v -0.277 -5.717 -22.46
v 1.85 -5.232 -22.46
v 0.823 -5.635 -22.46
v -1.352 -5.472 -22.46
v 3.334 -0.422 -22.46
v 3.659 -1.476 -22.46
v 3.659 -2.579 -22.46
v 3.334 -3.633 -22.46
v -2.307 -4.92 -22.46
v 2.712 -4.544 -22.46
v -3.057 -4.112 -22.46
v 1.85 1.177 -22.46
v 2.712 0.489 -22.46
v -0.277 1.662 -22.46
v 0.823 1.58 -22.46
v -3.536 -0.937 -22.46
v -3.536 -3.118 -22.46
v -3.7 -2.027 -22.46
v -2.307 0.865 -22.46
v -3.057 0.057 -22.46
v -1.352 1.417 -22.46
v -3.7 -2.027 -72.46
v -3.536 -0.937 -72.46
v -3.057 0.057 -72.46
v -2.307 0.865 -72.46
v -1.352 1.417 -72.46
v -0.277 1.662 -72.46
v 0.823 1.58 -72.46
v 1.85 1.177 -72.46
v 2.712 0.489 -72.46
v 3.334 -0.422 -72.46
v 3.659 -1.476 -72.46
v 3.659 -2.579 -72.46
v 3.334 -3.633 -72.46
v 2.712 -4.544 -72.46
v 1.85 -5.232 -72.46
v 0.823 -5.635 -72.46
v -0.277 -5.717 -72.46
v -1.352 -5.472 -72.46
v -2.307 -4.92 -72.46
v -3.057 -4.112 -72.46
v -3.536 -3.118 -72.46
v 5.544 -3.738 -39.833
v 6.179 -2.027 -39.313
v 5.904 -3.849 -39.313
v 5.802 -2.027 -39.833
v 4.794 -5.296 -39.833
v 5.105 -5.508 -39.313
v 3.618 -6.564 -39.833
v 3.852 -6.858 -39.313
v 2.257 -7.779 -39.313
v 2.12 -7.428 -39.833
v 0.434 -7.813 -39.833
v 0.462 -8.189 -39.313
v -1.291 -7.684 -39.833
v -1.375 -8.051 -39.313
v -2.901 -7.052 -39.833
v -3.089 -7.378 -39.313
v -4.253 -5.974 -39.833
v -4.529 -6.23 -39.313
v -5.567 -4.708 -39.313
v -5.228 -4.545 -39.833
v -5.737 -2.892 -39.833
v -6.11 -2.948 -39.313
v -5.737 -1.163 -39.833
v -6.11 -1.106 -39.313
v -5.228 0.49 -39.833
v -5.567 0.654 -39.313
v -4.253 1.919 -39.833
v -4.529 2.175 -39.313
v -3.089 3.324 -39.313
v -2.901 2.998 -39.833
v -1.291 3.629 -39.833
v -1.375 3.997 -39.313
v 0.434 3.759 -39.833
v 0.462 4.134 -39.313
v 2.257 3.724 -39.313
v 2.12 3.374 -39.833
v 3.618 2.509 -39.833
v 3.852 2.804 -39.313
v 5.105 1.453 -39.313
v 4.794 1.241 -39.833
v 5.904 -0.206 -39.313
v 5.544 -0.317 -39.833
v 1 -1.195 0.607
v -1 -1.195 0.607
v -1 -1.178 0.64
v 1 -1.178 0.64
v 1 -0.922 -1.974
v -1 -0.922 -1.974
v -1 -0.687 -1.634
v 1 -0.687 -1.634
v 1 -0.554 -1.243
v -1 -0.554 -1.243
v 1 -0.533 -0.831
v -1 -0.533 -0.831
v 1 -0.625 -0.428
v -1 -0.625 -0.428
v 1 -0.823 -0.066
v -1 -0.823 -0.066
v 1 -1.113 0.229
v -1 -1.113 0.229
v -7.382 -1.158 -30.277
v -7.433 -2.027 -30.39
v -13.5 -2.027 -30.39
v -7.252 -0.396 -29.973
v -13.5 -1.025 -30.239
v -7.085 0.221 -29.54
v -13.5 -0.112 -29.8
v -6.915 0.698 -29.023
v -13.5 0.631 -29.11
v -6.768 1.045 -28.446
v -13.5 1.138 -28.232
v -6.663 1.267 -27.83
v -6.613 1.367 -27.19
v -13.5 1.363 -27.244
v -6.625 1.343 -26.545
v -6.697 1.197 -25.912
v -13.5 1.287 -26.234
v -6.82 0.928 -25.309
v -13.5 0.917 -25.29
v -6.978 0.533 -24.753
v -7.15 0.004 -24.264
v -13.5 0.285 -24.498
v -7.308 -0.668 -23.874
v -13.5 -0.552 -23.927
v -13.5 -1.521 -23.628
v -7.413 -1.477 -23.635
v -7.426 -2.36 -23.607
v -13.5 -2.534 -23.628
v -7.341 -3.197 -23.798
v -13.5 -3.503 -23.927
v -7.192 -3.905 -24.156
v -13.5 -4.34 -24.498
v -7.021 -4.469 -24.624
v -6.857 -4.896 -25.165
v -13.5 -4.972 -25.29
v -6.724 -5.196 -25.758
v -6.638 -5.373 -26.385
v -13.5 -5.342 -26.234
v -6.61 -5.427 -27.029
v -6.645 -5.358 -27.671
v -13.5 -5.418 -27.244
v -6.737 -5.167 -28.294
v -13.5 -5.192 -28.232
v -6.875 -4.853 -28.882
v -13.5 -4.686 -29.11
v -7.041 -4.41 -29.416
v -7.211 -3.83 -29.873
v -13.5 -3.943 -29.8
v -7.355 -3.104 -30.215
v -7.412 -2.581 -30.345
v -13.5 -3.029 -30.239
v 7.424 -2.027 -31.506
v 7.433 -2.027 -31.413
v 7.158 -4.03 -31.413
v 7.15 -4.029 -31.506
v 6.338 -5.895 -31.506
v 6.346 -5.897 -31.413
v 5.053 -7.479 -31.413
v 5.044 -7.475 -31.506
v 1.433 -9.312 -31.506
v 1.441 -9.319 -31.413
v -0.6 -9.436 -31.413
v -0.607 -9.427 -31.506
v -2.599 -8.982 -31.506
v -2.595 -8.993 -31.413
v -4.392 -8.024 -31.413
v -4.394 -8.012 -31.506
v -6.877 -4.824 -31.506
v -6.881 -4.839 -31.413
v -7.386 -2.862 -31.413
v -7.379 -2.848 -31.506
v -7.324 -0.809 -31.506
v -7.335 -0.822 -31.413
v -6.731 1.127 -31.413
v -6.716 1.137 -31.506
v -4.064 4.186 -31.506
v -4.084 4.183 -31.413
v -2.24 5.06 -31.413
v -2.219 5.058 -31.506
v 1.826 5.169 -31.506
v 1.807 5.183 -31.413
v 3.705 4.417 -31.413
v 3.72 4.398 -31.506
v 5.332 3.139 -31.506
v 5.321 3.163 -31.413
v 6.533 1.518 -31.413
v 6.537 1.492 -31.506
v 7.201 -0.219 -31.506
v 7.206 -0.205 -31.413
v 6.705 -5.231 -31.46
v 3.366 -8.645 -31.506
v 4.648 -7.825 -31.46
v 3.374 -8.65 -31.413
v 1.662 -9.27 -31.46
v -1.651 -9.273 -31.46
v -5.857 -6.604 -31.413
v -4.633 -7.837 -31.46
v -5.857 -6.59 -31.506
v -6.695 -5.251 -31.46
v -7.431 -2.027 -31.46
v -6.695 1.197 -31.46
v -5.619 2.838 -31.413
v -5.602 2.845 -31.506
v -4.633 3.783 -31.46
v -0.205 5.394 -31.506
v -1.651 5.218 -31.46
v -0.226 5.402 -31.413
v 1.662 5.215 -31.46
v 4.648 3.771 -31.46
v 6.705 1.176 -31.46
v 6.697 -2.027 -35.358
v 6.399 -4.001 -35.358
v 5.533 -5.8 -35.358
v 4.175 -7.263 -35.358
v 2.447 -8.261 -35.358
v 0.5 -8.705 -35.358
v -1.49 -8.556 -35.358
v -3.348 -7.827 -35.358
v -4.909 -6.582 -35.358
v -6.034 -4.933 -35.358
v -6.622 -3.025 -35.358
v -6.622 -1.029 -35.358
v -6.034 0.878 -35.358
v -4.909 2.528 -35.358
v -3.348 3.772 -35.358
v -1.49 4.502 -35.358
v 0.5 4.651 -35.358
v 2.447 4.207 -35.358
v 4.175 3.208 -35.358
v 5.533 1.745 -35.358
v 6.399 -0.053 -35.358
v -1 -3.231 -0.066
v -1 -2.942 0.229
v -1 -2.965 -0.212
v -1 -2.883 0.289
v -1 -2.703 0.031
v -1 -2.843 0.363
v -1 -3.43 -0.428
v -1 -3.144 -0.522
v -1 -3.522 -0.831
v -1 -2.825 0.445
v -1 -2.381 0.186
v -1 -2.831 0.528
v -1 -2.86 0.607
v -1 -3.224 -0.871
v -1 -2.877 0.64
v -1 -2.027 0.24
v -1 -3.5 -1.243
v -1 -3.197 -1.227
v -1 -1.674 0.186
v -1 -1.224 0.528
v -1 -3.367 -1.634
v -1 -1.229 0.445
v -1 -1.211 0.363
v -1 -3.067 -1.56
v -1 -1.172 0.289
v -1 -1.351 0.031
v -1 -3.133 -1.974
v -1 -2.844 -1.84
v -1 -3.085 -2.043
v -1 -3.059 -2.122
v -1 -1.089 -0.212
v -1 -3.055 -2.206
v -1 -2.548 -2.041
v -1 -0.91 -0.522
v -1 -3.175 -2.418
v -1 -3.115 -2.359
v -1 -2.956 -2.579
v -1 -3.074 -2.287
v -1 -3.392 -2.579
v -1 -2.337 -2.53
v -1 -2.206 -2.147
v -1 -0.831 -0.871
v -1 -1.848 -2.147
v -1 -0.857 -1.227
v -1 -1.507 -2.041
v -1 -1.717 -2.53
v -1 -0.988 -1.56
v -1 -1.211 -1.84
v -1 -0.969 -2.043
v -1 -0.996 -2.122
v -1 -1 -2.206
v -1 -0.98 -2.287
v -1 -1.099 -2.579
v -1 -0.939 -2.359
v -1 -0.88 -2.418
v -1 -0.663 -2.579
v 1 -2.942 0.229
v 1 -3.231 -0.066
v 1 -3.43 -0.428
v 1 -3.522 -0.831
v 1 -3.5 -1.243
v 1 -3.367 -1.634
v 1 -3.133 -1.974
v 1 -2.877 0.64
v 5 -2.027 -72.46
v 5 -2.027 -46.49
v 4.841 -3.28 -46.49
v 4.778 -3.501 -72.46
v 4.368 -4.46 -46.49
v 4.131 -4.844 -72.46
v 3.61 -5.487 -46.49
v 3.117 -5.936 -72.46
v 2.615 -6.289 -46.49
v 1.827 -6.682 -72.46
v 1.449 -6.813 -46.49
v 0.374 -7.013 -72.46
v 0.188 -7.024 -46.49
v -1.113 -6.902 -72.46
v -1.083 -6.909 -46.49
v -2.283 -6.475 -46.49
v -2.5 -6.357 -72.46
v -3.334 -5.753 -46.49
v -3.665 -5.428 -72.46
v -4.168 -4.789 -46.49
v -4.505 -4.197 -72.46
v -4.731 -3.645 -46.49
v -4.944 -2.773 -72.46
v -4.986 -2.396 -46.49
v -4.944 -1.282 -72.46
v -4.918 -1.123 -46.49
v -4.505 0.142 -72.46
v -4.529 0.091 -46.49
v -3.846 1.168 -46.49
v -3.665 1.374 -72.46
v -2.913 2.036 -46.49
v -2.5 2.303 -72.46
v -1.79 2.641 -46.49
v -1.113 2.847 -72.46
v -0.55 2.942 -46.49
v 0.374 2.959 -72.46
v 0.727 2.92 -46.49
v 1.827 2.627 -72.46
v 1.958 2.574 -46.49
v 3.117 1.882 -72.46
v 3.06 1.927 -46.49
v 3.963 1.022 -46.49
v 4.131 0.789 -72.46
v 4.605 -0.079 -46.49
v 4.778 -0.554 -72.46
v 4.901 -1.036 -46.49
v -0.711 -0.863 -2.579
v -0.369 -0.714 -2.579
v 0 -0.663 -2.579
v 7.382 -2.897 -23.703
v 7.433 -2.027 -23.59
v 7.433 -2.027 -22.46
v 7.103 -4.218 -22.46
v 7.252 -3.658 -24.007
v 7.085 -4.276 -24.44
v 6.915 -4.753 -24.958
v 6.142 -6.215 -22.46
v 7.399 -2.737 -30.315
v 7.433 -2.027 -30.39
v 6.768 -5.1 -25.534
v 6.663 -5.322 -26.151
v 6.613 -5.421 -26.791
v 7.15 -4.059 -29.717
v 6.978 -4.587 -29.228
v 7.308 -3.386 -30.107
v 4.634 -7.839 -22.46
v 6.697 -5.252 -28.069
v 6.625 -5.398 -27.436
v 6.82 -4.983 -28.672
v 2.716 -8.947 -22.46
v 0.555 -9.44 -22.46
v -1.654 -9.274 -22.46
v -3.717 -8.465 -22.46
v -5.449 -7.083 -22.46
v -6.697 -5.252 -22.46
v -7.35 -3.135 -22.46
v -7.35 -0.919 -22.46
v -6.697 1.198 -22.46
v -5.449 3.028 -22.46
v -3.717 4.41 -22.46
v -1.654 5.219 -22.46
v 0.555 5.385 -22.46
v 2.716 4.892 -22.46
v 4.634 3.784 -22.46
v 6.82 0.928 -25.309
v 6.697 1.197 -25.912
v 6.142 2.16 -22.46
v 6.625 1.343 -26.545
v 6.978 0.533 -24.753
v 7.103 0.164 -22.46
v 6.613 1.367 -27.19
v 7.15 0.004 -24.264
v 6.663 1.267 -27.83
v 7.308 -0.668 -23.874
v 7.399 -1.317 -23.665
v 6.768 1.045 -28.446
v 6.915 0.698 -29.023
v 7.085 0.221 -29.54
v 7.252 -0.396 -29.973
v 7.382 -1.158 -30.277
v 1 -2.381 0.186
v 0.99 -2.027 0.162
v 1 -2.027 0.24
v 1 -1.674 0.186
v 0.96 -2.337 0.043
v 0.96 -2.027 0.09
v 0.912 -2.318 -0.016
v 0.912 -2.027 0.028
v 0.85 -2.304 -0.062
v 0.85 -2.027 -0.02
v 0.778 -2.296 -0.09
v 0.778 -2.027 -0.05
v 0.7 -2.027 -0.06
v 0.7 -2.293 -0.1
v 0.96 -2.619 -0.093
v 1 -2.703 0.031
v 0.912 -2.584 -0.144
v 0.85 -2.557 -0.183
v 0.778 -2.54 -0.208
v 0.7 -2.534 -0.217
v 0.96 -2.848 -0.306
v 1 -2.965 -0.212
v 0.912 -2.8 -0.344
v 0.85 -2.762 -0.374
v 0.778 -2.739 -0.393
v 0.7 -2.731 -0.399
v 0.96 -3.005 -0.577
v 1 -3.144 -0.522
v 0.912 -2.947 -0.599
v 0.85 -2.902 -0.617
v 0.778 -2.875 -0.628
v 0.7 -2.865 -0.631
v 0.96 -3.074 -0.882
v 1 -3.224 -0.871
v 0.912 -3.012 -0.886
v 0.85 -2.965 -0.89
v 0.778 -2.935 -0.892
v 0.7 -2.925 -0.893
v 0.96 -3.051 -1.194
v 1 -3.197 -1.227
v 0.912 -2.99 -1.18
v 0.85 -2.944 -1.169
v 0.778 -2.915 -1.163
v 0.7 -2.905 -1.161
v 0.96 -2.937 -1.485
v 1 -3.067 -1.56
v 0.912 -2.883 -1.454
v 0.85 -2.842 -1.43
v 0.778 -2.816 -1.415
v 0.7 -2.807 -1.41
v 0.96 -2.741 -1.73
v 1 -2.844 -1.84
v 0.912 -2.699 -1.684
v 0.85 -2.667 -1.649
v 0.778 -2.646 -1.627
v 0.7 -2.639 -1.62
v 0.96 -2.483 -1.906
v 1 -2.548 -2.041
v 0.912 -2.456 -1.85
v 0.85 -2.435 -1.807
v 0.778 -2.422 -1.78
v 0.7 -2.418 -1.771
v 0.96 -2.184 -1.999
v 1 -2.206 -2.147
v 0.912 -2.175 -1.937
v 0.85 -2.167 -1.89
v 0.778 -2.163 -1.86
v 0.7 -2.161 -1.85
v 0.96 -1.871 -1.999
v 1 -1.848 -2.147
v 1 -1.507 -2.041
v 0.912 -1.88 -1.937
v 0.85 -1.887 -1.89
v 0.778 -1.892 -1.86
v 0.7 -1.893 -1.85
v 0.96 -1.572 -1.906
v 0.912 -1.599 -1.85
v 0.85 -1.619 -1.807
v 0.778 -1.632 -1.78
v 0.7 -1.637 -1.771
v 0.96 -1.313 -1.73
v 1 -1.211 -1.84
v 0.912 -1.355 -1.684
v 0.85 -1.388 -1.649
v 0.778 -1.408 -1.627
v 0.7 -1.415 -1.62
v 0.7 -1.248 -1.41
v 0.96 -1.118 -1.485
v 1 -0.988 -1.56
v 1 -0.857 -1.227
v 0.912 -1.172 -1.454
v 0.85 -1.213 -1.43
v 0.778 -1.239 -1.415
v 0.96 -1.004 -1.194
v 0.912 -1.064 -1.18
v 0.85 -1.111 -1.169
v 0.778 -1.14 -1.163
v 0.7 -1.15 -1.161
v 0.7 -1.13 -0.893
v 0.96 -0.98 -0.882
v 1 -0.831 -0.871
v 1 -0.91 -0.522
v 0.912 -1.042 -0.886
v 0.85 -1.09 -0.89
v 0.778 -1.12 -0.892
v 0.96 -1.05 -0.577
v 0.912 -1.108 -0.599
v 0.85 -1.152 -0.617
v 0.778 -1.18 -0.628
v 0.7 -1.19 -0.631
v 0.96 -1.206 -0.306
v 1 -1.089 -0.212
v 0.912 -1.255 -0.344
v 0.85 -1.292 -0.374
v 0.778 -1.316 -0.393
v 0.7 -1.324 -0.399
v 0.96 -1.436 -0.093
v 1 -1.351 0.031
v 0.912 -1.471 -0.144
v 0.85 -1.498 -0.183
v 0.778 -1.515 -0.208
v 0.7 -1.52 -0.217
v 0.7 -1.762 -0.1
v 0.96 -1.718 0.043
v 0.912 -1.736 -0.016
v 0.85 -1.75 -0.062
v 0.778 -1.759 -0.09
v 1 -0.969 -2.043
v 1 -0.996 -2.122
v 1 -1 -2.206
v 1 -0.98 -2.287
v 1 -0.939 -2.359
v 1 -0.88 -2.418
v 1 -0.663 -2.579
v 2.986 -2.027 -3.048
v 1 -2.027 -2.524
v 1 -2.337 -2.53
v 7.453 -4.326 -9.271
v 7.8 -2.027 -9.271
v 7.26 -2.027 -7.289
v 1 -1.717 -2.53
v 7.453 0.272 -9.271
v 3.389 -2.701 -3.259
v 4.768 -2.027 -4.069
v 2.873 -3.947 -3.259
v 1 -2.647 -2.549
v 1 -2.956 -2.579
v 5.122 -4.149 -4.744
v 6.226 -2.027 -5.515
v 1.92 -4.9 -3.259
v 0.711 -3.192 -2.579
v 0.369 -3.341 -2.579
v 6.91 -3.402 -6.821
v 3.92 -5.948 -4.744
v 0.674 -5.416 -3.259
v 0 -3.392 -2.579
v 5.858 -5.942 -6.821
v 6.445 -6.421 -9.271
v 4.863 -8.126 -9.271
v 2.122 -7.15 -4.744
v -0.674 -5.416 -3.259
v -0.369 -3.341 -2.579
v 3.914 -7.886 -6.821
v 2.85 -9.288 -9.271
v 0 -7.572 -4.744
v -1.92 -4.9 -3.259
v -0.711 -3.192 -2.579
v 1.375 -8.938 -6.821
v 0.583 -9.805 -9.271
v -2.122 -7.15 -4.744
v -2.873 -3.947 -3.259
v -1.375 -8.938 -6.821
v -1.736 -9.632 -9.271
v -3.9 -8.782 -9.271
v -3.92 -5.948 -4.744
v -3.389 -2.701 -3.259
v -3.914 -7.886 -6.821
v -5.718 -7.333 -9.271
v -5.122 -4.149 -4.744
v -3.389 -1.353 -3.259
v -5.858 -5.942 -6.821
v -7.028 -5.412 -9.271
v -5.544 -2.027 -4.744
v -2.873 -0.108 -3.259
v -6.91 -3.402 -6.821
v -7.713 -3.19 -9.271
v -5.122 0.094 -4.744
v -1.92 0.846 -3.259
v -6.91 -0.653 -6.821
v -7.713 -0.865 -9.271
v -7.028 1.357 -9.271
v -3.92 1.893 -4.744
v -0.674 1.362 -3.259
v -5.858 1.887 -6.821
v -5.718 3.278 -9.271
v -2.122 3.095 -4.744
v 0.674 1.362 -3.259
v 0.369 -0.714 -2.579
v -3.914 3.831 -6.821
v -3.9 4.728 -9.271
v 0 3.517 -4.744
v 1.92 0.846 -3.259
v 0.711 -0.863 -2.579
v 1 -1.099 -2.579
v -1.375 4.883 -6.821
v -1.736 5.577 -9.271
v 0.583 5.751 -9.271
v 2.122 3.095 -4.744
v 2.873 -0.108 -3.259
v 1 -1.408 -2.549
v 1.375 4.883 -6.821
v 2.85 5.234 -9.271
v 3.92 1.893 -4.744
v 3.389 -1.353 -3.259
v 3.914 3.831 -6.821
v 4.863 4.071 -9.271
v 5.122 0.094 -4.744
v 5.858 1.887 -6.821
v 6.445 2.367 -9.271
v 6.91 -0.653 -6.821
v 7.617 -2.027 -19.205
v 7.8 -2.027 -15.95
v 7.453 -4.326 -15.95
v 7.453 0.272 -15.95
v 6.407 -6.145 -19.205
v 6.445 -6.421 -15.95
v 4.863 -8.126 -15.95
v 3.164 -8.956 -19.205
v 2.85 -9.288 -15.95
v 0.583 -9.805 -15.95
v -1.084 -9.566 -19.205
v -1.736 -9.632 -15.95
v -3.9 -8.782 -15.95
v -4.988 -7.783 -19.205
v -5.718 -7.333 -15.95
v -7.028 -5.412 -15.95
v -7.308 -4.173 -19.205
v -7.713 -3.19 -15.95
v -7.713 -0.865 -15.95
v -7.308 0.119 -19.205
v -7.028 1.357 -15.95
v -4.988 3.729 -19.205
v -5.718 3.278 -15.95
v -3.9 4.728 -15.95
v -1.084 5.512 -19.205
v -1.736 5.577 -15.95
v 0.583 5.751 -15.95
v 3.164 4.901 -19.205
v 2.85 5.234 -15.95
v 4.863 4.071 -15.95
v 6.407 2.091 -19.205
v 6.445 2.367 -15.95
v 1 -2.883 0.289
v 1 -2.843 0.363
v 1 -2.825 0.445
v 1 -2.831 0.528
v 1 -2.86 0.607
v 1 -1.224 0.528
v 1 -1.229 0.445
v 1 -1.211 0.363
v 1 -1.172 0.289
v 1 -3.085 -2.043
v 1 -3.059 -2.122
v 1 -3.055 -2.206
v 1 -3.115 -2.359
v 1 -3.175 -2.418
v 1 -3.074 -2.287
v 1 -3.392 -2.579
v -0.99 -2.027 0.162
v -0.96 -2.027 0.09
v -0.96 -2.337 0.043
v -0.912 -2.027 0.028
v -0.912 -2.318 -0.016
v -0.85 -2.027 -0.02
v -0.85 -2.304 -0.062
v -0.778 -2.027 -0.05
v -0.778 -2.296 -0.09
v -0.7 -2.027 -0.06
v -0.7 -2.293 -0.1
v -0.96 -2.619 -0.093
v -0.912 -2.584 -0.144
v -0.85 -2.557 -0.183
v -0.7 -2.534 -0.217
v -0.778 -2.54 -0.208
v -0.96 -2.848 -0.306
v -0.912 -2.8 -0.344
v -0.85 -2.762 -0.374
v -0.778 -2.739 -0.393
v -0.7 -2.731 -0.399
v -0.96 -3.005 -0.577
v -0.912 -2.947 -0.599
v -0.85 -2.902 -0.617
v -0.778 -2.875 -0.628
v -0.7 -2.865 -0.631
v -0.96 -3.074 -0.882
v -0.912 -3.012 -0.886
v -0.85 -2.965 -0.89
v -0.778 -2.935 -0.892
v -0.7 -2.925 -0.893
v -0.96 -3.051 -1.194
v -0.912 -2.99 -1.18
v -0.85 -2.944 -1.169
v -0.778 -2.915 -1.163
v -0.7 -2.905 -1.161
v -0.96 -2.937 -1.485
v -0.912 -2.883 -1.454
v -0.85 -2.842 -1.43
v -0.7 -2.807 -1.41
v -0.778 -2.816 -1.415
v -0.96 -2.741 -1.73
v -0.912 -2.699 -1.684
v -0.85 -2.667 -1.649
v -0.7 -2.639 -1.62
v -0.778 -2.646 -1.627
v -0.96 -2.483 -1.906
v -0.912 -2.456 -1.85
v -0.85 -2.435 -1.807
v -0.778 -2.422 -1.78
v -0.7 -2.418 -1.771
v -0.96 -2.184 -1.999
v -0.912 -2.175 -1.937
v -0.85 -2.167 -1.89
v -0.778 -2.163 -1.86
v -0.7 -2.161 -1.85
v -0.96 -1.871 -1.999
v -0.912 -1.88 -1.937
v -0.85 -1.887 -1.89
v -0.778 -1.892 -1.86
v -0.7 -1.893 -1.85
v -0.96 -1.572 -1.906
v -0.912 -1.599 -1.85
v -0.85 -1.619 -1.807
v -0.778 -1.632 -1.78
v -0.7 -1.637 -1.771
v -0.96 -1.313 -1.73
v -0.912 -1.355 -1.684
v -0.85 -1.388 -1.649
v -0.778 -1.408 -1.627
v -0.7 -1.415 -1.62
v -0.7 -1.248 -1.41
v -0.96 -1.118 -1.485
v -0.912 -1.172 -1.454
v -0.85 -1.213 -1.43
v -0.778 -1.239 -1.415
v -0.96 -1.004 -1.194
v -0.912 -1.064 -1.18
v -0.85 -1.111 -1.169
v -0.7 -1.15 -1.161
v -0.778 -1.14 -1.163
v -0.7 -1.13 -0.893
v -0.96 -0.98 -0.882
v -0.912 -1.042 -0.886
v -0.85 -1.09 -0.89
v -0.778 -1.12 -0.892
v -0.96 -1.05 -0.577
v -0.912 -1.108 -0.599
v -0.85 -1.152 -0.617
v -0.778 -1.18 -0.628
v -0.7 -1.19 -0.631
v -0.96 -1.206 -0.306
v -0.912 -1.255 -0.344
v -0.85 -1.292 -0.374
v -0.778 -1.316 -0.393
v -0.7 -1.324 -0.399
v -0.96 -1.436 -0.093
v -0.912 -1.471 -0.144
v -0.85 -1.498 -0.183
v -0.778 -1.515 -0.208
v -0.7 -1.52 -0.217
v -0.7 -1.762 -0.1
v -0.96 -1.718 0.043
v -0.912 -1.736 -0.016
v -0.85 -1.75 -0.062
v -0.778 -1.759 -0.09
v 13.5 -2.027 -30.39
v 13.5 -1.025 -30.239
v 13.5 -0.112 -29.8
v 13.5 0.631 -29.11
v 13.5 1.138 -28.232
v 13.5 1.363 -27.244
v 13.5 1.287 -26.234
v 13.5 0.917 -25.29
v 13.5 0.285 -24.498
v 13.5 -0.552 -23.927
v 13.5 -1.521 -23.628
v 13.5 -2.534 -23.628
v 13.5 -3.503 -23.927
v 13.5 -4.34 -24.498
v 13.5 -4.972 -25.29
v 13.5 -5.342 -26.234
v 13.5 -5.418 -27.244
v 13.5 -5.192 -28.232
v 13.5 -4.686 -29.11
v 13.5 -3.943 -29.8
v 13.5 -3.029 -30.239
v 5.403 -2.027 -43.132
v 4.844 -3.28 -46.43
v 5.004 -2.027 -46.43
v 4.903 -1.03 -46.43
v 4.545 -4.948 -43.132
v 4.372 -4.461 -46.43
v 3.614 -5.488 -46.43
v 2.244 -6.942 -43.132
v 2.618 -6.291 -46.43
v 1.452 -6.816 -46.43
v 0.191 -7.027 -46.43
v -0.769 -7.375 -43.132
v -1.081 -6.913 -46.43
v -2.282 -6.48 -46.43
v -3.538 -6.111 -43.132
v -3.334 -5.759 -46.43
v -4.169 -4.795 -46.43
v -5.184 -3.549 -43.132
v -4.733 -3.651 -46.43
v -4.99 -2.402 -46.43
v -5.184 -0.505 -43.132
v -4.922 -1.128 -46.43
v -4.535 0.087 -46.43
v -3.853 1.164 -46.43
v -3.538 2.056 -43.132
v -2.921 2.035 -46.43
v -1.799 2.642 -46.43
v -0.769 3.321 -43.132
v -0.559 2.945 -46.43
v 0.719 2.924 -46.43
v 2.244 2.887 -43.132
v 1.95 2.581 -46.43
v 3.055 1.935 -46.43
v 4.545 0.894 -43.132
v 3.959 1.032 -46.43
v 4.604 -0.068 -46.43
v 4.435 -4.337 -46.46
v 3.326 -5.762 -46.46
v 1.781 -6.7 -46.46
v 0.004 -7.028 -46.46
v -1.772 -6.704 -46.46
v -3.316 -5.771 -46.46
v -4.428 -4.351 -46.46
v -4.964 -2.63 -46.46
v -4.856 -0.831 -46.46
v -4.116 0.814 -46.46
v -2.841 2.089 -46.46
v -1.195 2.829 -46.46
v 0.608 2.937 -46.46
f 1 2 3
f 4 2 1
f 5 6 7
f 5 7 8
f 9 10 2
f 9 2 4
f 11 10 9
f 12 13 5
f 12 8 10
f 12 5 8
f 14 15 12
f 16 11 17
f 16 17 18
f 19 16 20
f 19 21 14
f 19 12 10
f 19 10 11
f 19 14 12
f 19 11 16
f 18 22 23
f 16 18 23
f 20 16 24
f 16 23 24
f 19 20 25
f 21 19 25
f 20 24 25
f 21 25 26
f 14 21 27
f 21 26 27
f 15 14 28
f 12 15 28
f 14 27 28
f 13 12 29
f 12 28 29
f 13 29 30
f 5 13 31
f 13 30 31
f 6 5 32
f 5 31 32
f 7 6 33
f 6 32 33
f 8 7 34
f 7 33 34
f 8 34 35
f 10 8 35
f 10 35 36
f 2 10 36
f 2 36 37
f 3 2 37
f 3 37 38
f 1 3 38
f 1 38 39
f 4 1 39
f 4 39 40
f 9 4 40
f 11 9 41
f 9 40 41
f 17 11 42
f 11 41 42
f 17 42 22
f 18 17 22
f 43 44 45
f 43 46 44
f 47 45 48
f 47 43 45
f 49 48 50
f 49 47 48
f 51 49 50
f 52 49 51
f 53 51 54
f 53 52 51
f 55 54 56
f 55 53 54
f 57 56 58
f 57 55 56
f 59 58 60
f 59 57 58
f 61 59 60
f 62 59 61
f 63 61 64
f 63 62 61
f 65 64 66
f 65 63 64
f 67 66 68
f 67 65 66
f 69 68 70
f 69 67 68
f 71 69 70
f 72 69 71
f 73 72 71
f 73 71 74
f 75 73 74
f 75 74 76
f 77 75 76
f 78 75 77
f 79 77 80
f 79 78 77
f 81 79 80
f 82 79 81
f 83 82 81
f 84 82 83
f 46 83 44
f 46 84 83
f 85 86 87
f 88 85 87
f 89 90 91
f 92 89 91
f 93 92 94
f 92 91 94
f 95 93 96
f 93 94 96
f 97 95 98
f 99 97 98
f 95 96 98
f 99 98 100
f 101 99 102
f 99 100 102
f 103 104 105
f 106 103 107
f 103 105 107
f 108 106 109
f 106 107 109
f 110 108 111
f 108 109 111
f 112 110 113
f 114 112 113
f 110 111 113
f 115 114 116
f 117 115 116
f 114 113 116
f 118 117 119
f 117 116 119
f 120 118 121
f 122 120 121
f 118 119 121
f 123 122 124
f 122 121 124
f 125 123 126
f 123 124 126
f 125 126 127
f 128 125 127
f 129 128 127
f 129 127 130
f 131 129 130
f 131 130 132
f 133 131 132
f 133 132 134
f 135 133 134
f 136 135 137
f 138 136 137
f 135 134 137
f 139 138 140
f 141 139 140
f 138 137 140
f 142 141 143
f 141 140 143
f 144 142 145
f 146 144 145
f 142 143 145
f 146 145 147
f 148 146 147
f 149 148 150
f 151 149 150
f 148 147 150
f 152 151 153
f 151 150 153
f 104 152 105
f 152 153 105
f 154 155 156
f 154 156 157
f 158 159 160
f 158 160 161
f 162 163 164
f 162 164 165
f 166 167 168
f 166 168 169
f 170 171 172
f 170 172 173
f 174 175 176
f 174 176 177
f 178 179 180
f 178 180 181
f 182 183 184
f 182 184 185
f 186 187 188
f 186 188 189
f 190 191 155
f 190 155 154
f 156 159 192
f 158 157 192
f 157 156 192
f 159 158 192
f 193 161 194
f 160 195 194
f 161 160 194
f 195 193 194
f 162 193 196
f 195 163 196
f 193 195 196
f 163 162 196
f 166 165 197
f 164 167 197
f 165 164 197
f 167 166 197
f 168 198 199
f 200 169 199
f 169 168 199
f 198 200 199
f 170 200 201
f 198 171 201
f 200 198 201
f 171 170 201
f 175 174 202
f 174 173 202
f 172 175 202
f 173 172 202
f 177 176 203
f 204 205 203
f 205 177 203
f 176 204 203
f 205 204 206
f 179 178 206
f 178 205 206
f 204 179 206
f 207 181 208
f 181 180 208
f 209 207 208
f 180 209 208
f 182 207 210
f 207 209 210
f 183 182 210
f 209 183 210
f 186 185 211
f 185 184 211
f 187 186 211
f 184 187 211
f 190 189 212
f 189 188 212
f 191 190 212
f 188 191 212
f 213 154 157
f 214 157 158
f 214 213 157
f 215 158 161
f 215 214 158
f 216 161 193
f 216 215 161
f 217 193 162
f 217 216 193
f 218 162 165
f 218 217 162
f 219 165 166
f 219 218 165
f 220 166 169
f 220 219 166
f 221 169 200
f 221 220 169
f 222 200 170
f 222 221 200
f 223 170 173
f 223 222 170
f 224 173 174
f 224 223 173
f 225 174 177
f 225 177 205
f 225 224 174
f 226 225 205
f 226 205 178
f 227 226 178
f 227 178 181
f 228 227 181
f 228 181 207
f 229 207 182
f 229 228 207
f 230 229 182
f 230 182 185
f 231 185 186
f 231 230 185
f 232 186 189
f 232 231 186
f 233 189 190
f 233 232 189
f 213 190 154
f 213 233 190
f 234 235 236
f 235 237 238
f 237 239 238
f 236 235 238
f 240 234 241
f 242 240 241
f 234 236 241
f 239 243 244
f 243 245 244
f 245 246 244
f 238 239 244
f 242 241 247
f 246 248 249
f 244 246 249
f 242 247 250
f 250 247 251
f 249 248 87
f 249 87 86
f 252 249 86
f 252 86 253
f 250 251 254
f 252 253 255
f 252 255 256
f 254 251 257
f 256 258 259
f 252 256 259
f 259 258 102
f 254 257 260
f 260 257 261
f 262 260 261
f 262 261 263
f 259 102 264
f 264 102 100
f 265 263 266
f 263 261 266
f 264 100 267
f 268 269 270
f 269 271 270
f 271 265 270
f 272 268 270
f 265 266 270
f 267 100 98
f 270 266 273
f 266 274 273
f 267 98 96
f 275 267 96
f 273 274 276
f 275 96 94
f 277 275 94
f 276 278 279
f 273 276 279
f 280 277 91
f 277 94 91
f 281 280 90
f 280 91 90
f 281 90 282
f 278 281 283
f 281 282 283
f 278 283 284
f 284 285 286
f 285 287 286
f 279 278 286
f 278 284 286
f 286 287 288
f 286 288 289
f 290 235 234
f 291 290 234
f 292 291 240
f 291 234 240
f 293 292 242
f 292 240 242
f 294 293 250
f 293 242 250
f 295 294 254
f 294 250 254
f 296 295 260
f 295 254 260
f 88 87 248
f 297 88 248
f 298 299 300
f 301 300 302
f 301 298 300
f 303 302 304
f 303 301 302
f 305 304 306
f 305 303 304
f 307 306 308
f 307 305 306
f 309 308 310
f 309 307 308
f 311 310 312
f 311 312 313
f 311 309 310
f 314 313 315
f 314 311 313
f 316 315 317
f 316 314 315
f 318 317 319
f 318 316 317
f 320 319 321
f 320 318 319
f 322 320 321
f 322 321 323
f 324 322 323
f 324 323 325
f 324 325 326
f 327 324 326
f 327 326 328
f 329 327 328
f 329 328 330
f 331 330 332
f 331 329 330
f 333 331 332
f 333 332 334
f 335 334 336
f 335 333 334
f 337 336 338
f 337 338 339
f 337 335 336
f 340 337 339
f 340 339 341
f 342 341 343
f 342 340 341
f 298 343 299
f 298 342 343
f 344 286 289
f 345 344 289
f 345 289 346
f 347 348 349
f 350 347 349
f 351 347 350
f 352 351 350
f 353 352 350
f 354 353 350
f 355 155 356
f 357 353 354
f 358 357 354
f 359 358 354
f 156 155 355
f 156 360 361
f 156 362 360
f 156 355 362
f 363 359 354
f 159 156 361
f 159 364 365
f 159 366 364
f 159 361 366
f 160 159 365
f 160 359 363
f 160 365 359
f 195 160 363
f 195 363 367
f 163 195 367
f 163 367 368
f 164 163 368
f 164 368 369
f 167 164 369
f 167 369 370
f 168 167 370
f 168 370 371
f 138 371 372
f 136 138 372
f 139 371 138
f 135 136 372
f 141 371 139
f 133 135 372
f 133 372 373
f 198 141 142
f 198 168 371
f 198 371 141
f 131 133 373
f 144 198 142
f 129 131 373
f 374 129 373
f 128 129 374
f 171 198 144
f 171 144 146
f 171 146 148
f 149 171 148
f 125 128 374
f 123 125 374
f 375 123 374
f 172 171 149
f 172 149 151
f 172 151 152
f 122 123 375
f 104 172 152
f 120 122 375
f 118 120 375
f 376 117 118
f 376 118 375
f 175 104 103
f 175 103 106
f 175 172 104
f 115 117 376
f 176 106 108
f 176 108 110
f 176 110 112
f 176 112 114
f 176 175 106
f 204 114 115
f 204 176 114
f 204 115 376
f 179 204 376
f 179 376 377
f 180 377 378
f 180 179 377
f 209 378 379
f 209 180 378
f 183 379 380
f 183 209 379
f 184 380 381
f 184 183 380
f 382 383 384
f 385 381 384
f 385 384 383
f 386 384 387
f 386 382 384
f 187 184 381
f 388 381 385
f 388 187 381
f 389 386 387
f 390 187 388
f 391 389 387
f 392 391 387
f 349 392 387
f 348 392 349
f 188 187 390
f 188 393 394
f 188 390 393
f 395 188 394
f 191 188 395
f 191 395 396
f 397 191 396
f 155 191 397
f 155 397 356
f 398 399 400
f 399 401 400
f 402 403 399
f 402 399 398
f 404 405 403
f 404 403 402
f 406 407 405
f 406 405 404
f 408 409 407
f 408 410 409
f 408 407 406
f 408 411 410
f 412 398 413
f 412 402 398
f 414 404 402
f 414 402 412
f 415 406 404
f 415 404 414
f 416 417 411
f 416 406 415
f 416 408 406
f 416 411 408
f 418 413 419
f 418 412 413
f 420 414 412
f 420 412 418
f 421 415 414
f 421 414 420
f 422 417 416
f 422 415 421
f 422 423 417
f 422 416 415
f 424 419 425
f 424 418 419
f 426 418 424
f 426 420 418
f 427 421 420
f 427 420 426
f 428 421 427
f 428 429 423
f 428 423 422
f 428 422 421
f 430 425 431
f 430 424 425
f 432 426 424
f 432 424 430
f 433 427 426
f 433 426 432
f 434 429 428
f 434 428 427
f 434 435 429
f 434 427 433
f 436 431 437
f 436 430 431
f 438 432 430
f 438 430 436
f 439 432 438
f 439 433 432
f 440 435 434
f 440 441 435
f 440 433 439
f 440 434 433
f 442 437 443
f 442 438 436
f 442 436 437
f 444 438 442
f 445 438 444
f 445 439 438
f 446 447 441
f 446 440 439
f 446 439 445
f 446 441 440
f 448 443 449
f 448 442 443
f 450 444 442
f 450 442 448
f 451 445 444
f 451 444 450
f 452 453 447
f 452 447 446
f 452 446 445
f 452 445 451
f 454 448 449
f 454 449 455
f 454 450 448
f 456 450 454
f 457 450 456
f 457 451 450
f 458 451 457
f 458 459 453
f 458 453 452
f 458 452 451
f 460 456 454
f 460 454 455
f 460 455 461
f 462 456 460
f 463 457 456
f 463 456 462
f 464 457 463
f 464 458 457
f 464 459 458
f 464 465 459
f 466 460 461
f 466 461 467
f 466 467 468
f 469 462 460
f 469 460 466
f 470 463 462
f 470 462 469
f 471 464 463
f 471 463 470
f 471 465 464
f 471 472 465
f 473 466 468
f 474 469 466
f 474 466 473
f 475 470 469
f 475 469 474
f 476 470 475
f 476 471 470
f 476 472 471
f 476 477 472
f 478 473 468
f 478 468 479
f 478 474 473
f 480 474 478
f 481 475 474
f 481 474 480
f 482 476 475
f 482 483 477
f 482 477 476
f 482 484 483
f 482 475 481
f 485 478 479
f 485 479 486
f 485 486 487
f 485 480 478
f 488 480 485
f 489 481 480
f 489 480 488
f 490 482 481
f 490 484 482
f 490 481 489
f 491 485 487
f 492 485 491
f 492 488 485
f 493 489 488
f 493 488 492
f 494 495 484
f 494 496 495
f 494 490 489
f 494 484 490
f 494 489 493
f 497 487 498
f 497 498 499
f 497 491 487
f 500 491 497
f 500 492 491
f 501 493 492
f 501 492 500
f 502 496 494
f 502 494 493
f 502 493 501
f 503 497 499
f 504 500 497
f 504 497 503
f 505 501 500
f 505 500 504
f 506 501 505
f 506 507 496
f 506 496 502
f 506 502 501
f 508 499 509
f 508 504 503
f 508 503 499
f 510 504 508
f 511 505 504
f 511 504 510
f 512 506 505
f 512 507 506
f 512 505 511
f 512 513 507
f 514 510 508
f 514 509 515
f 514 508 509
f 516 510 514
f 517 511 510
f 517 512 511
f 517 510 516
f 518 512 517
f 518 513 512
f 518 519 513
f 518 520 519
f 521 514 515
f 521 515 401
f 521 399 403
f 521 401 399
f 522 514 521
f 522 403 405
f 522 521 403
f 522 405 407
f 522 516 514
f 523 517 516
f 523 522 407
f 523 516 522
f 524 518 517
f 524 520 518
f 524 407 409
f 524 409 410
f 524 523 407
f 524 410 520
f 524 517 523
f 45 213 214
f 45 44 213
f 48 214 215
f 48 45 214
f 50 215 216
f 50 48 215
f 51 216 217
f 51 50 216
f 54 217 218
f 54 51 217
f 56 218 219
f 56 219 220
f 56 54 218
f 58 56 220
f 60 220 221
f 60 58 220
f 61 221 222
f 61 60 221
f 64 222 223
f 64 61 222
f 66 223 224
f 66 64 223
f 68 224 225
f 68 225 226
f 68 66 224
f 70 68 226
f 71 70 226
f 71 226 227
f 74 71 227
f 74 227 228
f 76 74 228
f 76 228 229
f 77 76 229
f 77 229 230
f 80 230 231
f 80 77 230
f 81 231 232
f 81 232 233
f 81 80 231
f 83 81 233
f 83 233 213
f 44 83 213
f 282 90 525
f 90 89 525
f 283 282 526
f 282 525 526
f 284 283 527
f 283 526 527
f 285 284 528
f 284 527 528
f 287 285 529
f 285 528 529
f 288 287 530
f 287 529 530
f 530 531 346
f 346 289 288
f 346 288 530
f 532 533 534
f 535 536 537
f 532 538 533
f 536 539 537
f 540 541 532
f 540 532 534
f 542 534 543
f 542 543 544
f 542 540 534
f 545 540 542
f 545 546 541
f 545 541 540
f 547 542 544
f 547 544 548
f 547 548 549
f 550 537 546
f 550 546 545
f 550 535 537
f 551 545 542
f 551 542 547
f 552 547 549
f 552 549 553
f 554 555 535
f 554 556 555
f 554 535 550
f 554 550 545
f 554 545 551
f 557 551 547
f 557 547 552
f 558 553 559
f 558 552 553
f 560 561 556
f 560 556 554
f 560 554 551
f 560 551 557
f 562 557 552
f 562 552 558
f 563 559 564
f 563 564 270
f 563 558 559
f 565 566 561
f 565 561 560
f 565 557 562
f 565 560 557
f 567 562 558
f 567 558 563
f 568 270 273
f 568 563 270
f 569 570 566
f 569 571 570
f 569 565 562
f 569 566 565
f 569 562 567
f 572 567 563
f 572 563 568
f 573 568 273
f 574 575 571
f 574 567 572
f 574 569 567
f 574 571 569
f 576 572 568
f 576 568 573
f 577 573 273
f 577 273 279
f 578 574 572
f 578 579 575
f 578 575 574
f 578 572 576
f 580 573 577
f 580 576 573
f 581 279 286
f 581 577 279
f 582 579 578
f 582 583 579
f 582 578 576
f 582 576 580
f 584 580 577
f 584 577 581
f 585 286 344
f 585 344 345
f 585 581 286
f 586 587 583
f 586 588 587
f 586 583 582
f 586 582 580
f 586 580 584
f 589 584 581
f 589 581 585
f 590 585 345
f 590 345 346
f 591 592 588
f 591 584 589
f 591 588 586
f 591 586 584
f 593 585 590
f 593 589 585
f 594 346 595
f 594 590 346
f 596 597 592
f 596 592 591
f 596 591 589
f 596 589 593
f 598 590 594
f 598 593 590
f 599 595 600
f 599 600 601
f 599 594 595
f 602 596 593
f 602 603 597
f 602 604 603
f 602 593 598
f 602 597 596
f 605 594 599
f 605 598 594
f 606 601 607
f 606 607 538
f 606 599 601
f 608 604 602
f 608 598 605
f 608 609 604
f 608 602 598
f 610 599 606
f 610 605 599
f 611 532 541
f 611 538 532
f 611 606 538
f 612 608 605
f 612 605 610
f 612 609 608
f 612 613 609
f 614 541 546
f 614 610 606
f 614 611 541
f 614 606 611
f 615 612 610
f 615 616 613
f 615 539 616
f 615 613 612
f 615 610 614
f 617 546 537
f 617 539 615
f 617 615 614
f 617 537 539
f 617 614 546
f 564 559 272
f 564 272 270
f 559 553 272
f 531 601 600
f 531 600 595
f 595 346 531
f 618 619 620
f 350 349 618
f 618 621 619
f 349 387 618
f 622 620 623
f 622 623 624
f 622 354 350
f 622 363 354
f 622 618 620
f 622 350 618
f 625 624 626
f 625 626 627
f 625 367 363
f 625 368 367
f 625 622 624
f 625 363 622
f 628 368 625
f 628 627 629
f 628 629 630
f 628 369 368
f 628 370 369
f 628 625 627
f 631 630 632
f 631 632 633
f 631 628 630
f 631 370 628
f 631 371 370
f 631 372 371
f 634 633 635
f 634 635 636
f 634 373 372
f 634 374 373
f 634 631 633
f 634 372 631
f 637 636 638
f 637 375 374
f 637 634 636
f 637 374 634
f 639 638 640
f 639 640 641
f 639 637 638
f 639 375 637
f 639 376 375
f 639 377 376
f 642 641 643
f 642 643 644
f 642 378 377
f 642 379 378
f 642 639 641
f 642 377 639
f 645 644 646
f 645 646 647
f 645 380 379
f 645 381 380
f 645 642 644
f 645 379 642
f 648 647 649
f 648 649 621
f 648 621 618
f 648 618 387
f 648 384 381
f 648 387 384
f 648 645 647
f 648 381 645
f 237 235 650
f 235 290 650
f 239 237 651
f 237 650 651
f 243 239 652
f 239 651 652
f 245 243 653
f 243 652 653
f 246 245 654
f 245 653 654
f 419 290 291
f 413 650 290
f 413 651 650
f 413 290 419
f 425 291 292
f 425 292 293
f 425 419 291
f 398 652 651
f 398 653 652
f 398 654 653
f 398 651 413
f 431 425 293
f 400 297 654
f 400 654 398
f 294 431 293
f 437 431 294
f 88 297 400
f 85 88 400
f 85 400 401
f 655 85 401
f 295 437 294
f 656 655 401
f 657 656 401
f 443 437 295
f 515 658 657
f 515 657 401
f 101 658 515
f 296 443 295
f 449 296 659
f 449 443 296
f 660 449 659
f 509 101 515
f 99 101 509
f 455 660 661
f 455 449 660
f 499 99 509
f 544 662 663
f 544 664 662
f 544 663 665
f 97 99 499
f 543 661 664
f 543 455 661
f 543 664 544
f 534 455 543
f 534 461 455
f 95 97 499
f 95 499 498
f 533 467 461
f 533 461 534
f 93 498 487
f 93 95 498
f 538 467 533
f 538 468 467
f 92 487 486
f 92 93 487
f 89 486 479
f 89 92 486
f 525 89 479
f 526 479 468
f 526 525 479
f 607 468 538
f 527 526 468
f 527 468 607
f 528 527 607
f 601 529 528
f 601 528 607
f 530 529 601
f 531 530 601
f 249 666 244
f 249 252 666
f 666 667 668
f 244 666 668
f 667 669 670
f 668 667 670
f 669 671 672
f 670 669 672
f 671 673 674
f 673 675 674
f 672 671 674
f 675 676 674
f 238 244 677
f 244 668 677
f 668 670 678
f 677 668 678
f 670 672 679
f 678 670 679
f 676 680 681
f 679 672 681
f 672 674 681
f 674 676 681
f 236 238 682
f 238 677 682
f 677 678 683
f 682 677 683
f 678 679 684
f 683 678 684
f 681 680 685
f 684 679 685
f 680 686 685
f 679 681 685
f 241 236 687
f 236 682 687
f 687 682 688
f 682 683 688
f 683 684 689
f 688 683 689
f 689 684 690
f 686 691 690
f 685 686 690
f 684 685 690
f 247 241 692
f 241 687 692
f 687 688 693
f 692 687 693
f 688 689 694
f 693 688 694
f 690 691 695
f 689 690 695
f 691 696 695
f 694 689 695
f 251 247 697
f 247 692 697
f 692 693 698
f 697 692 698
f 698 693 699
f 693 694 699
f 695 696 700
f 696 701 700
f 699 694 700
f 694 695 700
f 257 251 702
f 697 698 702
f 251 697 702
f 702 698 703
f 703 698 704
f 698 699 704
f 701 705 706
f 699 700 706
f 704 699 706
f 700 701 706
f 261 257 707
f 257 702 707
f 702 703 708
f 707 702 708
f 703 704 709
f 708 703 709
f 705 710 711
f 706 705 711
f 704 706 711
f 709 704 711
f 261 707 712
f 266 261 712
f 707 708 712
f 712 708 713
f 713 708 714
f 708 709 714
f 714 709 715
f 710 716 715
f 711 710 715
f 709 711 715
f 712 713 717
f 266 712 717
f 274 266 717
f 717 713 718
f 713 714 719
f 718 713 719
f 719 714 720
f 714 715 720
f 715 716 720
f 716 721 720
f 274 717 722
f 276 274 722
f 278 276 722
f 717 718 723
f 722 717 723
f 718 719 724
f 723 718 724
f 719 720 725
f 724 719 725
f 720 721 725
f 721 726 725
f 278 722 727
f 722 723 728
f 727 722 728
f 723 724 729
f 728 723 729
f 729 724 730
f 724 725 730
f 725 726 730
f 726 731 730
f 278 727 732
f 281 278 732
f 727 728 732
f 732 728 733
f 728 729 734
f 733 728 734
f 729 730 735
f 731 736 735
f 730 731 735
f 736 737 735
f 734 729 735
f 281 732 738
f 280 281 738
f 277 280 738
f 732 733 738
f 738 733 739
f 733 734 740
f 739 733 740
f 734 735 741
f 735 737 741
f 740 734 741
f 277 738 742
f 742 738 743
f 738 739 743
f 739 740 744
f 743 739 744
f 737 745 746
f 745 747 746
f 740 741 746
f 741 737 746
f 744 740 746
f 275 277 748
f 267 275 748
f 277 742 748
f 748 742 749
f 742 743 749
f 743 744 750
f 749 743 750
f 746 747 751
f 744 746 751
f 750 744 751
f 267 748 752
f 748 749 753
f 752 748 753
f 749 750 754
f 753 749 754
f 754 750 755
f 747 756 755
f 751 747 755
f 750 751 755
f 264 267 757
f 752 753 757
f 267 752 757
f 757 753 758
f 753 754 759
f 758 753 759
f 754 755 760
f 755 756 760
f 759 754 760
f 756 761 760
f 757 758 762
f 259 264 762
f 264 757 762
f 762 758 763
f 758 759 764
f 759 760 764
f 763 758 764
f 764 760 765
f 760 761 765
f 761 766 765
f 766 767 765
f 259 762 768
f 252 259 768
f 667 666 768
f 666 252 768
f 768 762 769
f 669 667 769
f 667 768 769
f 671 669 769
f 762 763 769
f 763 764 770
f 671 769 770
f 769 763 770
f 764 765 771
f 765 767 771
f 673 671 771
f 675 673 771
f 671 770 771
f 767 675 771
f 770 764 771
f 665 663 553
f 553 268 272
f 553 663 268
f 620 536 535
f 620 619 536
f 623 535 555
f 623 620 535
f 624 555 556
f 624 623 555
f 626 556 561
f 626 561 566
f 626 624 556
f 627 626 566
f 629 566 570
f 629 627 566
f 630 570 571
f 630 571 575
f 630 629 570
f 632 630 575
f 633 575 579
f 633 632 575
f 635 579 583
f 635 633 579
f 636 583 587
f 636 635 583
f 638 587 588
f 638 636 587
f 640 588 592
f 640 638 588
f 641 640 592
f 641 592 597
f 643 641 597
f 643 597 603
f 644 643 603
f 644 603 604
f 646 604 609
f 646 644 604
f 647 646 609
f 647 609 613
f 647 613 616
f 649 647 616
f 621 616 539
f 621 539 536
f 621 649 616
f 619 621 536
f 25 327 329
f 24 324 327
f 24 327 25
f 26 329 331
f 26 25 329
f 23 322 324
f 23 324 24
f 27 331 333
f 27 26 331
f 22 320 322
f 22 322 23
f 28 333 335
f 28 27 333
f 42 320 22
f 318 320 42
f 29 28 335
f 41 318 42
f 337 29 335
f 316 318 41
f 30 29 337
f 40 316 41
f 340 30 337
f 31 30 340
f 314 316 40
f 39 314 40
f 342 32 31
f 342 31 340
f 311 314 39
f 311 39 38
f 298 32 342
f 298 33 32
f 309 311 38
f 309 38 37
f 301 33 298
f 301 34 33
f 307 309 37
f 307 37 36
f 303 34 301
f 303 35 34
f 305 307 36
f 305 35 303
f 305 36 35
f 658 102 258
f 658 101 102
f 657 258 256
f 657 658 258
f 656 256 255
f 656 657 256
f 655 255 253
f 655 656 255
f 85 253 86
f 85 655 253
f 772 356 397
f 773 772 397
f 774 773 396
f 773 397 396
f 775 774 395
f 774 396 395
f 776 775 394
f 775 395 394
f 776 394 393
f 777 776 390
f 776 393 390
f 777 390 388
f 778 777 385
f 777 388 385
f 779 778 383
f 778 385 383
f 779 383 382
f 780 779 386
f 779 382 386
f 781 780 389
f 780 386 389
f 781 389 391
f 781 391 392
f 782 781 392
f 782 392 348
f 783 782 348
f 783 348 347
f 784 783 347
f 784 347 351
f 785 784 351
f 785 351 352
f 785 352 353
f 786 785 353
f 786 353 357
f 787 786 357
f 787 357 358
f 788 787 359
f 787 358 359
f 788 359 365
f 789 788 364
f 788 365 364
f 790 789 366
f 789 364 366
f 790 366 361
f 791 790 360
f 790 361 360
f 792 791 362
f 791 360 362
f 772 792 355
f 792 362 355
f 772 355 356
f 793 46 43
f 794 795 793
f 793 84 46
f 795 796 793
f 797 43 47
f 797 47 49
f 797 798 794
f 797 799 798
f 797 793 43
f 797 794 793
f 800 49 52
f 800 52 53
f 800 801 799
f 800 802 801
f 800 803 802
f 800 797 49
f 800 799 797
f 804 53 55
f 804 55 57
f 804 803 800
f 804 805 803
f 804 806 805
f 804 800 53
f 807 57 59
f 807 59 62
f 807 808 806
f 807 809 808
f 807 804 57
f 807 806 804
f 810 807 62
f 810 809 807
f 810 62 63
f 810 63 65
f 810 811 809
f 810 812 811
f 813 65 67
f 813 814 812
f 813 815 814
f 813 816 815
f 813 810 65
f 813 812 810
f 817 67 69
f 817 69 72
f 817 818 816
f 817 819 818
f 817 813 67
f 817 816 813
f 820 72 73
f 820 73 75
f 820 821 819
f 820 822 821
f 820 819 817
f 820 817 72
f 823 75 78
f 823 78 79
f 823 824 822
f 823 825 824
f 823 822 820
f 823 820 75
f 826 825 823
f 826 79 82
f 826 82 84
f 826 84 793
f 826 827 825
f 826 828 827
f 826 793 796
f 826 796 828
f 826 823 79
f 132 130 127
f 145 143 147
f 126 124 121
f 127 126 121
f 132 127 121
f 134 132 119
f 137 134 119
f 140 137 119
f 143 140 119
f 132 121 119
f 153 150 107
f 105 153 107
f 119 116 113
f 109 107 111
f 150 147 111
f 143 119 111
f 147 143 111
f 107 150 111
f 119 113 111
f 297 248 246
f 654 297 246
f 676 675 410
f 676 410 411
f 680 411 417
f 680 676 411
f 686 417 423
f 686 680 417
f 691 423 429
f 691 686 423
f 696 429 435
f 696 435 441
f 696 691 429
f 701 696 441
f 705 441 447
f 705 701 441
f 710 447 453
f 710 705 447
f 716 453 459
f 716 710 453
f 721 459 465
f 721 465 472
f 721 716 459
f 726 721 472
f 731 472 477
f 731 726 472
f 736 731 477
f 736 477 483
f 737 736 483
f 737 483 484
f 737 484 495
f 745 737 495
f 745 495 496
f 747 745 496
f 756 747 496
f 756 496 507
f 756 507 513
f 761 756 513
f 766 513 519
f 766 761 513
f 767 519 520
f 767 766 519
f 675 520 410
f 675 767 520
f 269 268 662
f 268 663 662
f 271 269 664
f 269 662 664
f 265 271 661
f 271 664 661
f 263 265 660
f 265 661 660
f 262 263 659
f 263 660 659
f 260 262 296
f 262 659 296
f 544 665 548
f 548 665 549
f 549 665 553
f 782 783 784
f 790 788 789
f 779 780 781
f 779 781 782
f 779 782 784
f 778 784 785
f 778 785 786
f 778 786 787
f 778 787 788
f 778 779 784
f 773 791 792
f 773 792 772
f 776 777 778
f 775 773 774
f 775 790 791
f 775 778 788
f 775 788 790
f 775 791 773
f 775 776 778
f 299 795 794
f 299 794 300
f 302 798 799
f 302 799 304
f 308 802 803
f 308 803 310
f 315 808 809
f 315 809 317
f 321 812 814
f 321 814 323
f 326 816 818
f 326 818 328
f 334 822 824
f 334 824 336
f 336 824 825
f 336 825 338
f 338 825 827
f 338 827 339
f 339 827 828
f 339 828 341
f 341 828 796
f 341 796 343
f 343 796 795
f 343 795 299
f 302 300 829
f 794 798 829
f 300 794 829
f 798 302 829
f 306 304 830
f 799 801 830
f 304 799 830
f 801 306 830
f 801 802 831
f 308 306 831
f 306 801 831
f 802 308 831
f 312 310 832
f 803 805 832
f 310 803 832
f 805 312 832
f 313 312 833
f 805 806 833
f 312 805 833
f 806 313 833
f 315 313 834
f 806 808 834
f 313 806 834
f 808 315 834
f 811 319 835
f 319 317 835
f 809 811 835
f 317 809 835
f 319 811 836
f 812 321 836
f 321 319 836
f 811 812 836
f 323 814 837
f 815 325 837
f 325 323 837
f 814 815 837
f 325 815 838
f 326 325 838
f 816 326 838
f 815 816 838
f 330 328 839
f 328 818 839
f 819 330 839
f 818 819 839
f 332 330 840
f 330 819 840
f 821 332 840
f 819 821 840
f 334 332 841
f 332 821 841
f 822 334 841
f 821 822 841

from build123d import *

# Parameters (mm, degrees)
FILLET2_R                = 0.5
BOSS_EXTRUDE1_DEPTH      = 13.5
BOSS_EXTRUDE1_DEPTH_BACK = 13.5
SKETCH4_R                = 3.4
SKETCH2_R                = 3.7
CUT_EXTRUDE3_DEPTH       = 50
BOSS_EXTRUDE4_DEPTH      = 1
BOSS_EXTRUDE4_DEPTH_BACK = 1
FILLET10_R               = 0.3
FILLET11_R               = 0.3
FILLET12_R               = 0.3


with BuildPart() as part:
    # Sketch1 → Revolve3 (revolve)
    with BuildSketch(Plane(origin=(0, 0, 0), x_dir=(0, 0, -1), z_dir=(1, 0, 0))):
        with BuildLine():
            Line((9.270955764, 5.772702061), (15.949995133, 5.772702061))
            Line((15.949995133, 5.772702061), (22.460257938, 5.405787473))
            Line((22.460257938, 5.405787473), (31.460257938, 5.405787473))
            Line((31.460257938, 5.405787473), (35.358038474, 4.669508623))
            Line((35.358038474, 4.669508623), (39.313400178, 4.15154459))
            Line((39.313400178, 4.15154459), (39.833484347, 3.774843476))
            Line((39.833484347, 3.774843476), (46.460257938, 2.972702061))
            Line((46.460257938, 2.972702061), (72.460257938, 2.972702061))
            Line((72.460257938, 2.972702061), (72.460257938, -2.027297939))
            Line((72.460257938, -2.027297939), (2.460257938, -2.027297939))
            ThreePointArc((2.460257938, -2.027297939), (4.402552529, 3.150191919), (9.270955764, 5.772702061))
        make_face()
    revolve(axis=Axis((0, -2.027297939, -2.460257938), (0, 0, -1)))

    # Fillet2
    fillet2_edges = [part.edges().sort_by_distance(p)[0] for p in [
        (0, -9.46038335, -31.460257938),
        (0, -9.46038335, -22.460257938),
        (0, -8.7241045, -35.358038474),
        (0, -7.027297939, -46.460257938),
    ]]
    fillet(fillet2_edges, radius=FILLET2_R)

    # Sketch4 → Boss-Extrude1 (add, two sides: drawn at the far end of the back side and taken through both)
    with BuildSketch(Plane(origin=(0, 0, 0), x_dir=(0, 0, -1), z_dir=(1, 0, 0)).offset(-BOSS_EXTRUDE1_DEPTH_BACK)):
        with Locations((26.990295722, -2.027297939)):
            Circle(SKETCH4_R)
    extrude(amount=BOSS_EXTRUDE1_DEPTH + BOSS_EXTRUDE1_DEPTH_BACK)

    # Sketch2 → Cut-Extrude3 (cut)
    with BuildSketch(Plane(origin=(0, 0, -72.460257938), x_dir=(-1, 0, 0), z_dir=(0, 0, -1))):
        with Locations((0, -2.027297939)):
            Circle(SKETCH2_R)
    extrude(amount=-CUT_EXTRUDE3_DEPTH, mode=Mode.SUBTRACT)

    # Sketch5 → Boss-Extrude4 (add, two sides: drawn at the far end of the back side and taken through both)
    with BuildSketch(Plane(origin=(0, 0, 0), x_dir=(0, 0, -1), z_dir=(1, 0, 0)).offset(-BOSS_EXTRUDE4_DEPTH_BACK)):
        with BuildLine():
            Line((-0.364563148, -1.323842828), (-0.639628828, -1.177788119))
            Line((-0.639628828, -1.177788119), (-0.639628828, -2.876807758))
            Line((-0.639628828, -2.876807758), (-0.364563148, -2.730753049))
            ThreePointArc((-0.364563148, -2.730753049), (0.874853819, -3.524864677), (2.196515624, -2.876807758))
            Line((2.196515624, -2.876807758), (2.579405143, -3.3917107))
            Line((2.579405143, -3.3917107), (2.579405143, -0.662885177))
            Line((2.579405143, -0.662885177), (2.196515624, -1.177788119))
            ThreePointArc((2.196515624, -1.177788119), (0.874853819, -0.5297312), (-0.364563148, -1.323842828))
        make_face()
        with BuildLine():
            ThreePointArc((1.860257938, -2.027297939), (0.960257938, -1.127297939), (0.060257938, -2.027297939))
            ThreePointArc((0.060257938, -2.027297939), (0.960257938, -2.927297939), (1.860257938, -2.027297939))
        make_face(mode=Mode.SUBTRACT)
    extrude(amount=BOSS_EXTRUDE4_DEPTH + BOSS_EXTRUDE4_DEPTH_BACK)

    # Fillet10
    fillet10_edges = [part.edges().sort_by_distance(p)[0] for p in [
        (1, -2.027297939, -1.860257938),
        (-1, -2.027297939, -1.860257938),
    ]]
    fillet(fillet10_edges, radius=FILLET10_R)

    # Fillet11
    fillet11_edges = [part.edges().sort_by_distance(p)[0] for p in [
        (0, -2.730753049, 0.364563148),
        (0, -1.323842828, 0.364563148),
    ]]
    fillet(fillet11_edges, radius=FILLET11_R)

    # Fillet12
    fillet12_edges = [part.edges().sort_by_distance(p)[0] for p in [
        (0, -2.876807758, -2.196515624),
        (0, -1.177788119, -2.196515624),
    ]]
    fillet(fillet12_edges, radius=FILLET12_R)


solid = part.part
